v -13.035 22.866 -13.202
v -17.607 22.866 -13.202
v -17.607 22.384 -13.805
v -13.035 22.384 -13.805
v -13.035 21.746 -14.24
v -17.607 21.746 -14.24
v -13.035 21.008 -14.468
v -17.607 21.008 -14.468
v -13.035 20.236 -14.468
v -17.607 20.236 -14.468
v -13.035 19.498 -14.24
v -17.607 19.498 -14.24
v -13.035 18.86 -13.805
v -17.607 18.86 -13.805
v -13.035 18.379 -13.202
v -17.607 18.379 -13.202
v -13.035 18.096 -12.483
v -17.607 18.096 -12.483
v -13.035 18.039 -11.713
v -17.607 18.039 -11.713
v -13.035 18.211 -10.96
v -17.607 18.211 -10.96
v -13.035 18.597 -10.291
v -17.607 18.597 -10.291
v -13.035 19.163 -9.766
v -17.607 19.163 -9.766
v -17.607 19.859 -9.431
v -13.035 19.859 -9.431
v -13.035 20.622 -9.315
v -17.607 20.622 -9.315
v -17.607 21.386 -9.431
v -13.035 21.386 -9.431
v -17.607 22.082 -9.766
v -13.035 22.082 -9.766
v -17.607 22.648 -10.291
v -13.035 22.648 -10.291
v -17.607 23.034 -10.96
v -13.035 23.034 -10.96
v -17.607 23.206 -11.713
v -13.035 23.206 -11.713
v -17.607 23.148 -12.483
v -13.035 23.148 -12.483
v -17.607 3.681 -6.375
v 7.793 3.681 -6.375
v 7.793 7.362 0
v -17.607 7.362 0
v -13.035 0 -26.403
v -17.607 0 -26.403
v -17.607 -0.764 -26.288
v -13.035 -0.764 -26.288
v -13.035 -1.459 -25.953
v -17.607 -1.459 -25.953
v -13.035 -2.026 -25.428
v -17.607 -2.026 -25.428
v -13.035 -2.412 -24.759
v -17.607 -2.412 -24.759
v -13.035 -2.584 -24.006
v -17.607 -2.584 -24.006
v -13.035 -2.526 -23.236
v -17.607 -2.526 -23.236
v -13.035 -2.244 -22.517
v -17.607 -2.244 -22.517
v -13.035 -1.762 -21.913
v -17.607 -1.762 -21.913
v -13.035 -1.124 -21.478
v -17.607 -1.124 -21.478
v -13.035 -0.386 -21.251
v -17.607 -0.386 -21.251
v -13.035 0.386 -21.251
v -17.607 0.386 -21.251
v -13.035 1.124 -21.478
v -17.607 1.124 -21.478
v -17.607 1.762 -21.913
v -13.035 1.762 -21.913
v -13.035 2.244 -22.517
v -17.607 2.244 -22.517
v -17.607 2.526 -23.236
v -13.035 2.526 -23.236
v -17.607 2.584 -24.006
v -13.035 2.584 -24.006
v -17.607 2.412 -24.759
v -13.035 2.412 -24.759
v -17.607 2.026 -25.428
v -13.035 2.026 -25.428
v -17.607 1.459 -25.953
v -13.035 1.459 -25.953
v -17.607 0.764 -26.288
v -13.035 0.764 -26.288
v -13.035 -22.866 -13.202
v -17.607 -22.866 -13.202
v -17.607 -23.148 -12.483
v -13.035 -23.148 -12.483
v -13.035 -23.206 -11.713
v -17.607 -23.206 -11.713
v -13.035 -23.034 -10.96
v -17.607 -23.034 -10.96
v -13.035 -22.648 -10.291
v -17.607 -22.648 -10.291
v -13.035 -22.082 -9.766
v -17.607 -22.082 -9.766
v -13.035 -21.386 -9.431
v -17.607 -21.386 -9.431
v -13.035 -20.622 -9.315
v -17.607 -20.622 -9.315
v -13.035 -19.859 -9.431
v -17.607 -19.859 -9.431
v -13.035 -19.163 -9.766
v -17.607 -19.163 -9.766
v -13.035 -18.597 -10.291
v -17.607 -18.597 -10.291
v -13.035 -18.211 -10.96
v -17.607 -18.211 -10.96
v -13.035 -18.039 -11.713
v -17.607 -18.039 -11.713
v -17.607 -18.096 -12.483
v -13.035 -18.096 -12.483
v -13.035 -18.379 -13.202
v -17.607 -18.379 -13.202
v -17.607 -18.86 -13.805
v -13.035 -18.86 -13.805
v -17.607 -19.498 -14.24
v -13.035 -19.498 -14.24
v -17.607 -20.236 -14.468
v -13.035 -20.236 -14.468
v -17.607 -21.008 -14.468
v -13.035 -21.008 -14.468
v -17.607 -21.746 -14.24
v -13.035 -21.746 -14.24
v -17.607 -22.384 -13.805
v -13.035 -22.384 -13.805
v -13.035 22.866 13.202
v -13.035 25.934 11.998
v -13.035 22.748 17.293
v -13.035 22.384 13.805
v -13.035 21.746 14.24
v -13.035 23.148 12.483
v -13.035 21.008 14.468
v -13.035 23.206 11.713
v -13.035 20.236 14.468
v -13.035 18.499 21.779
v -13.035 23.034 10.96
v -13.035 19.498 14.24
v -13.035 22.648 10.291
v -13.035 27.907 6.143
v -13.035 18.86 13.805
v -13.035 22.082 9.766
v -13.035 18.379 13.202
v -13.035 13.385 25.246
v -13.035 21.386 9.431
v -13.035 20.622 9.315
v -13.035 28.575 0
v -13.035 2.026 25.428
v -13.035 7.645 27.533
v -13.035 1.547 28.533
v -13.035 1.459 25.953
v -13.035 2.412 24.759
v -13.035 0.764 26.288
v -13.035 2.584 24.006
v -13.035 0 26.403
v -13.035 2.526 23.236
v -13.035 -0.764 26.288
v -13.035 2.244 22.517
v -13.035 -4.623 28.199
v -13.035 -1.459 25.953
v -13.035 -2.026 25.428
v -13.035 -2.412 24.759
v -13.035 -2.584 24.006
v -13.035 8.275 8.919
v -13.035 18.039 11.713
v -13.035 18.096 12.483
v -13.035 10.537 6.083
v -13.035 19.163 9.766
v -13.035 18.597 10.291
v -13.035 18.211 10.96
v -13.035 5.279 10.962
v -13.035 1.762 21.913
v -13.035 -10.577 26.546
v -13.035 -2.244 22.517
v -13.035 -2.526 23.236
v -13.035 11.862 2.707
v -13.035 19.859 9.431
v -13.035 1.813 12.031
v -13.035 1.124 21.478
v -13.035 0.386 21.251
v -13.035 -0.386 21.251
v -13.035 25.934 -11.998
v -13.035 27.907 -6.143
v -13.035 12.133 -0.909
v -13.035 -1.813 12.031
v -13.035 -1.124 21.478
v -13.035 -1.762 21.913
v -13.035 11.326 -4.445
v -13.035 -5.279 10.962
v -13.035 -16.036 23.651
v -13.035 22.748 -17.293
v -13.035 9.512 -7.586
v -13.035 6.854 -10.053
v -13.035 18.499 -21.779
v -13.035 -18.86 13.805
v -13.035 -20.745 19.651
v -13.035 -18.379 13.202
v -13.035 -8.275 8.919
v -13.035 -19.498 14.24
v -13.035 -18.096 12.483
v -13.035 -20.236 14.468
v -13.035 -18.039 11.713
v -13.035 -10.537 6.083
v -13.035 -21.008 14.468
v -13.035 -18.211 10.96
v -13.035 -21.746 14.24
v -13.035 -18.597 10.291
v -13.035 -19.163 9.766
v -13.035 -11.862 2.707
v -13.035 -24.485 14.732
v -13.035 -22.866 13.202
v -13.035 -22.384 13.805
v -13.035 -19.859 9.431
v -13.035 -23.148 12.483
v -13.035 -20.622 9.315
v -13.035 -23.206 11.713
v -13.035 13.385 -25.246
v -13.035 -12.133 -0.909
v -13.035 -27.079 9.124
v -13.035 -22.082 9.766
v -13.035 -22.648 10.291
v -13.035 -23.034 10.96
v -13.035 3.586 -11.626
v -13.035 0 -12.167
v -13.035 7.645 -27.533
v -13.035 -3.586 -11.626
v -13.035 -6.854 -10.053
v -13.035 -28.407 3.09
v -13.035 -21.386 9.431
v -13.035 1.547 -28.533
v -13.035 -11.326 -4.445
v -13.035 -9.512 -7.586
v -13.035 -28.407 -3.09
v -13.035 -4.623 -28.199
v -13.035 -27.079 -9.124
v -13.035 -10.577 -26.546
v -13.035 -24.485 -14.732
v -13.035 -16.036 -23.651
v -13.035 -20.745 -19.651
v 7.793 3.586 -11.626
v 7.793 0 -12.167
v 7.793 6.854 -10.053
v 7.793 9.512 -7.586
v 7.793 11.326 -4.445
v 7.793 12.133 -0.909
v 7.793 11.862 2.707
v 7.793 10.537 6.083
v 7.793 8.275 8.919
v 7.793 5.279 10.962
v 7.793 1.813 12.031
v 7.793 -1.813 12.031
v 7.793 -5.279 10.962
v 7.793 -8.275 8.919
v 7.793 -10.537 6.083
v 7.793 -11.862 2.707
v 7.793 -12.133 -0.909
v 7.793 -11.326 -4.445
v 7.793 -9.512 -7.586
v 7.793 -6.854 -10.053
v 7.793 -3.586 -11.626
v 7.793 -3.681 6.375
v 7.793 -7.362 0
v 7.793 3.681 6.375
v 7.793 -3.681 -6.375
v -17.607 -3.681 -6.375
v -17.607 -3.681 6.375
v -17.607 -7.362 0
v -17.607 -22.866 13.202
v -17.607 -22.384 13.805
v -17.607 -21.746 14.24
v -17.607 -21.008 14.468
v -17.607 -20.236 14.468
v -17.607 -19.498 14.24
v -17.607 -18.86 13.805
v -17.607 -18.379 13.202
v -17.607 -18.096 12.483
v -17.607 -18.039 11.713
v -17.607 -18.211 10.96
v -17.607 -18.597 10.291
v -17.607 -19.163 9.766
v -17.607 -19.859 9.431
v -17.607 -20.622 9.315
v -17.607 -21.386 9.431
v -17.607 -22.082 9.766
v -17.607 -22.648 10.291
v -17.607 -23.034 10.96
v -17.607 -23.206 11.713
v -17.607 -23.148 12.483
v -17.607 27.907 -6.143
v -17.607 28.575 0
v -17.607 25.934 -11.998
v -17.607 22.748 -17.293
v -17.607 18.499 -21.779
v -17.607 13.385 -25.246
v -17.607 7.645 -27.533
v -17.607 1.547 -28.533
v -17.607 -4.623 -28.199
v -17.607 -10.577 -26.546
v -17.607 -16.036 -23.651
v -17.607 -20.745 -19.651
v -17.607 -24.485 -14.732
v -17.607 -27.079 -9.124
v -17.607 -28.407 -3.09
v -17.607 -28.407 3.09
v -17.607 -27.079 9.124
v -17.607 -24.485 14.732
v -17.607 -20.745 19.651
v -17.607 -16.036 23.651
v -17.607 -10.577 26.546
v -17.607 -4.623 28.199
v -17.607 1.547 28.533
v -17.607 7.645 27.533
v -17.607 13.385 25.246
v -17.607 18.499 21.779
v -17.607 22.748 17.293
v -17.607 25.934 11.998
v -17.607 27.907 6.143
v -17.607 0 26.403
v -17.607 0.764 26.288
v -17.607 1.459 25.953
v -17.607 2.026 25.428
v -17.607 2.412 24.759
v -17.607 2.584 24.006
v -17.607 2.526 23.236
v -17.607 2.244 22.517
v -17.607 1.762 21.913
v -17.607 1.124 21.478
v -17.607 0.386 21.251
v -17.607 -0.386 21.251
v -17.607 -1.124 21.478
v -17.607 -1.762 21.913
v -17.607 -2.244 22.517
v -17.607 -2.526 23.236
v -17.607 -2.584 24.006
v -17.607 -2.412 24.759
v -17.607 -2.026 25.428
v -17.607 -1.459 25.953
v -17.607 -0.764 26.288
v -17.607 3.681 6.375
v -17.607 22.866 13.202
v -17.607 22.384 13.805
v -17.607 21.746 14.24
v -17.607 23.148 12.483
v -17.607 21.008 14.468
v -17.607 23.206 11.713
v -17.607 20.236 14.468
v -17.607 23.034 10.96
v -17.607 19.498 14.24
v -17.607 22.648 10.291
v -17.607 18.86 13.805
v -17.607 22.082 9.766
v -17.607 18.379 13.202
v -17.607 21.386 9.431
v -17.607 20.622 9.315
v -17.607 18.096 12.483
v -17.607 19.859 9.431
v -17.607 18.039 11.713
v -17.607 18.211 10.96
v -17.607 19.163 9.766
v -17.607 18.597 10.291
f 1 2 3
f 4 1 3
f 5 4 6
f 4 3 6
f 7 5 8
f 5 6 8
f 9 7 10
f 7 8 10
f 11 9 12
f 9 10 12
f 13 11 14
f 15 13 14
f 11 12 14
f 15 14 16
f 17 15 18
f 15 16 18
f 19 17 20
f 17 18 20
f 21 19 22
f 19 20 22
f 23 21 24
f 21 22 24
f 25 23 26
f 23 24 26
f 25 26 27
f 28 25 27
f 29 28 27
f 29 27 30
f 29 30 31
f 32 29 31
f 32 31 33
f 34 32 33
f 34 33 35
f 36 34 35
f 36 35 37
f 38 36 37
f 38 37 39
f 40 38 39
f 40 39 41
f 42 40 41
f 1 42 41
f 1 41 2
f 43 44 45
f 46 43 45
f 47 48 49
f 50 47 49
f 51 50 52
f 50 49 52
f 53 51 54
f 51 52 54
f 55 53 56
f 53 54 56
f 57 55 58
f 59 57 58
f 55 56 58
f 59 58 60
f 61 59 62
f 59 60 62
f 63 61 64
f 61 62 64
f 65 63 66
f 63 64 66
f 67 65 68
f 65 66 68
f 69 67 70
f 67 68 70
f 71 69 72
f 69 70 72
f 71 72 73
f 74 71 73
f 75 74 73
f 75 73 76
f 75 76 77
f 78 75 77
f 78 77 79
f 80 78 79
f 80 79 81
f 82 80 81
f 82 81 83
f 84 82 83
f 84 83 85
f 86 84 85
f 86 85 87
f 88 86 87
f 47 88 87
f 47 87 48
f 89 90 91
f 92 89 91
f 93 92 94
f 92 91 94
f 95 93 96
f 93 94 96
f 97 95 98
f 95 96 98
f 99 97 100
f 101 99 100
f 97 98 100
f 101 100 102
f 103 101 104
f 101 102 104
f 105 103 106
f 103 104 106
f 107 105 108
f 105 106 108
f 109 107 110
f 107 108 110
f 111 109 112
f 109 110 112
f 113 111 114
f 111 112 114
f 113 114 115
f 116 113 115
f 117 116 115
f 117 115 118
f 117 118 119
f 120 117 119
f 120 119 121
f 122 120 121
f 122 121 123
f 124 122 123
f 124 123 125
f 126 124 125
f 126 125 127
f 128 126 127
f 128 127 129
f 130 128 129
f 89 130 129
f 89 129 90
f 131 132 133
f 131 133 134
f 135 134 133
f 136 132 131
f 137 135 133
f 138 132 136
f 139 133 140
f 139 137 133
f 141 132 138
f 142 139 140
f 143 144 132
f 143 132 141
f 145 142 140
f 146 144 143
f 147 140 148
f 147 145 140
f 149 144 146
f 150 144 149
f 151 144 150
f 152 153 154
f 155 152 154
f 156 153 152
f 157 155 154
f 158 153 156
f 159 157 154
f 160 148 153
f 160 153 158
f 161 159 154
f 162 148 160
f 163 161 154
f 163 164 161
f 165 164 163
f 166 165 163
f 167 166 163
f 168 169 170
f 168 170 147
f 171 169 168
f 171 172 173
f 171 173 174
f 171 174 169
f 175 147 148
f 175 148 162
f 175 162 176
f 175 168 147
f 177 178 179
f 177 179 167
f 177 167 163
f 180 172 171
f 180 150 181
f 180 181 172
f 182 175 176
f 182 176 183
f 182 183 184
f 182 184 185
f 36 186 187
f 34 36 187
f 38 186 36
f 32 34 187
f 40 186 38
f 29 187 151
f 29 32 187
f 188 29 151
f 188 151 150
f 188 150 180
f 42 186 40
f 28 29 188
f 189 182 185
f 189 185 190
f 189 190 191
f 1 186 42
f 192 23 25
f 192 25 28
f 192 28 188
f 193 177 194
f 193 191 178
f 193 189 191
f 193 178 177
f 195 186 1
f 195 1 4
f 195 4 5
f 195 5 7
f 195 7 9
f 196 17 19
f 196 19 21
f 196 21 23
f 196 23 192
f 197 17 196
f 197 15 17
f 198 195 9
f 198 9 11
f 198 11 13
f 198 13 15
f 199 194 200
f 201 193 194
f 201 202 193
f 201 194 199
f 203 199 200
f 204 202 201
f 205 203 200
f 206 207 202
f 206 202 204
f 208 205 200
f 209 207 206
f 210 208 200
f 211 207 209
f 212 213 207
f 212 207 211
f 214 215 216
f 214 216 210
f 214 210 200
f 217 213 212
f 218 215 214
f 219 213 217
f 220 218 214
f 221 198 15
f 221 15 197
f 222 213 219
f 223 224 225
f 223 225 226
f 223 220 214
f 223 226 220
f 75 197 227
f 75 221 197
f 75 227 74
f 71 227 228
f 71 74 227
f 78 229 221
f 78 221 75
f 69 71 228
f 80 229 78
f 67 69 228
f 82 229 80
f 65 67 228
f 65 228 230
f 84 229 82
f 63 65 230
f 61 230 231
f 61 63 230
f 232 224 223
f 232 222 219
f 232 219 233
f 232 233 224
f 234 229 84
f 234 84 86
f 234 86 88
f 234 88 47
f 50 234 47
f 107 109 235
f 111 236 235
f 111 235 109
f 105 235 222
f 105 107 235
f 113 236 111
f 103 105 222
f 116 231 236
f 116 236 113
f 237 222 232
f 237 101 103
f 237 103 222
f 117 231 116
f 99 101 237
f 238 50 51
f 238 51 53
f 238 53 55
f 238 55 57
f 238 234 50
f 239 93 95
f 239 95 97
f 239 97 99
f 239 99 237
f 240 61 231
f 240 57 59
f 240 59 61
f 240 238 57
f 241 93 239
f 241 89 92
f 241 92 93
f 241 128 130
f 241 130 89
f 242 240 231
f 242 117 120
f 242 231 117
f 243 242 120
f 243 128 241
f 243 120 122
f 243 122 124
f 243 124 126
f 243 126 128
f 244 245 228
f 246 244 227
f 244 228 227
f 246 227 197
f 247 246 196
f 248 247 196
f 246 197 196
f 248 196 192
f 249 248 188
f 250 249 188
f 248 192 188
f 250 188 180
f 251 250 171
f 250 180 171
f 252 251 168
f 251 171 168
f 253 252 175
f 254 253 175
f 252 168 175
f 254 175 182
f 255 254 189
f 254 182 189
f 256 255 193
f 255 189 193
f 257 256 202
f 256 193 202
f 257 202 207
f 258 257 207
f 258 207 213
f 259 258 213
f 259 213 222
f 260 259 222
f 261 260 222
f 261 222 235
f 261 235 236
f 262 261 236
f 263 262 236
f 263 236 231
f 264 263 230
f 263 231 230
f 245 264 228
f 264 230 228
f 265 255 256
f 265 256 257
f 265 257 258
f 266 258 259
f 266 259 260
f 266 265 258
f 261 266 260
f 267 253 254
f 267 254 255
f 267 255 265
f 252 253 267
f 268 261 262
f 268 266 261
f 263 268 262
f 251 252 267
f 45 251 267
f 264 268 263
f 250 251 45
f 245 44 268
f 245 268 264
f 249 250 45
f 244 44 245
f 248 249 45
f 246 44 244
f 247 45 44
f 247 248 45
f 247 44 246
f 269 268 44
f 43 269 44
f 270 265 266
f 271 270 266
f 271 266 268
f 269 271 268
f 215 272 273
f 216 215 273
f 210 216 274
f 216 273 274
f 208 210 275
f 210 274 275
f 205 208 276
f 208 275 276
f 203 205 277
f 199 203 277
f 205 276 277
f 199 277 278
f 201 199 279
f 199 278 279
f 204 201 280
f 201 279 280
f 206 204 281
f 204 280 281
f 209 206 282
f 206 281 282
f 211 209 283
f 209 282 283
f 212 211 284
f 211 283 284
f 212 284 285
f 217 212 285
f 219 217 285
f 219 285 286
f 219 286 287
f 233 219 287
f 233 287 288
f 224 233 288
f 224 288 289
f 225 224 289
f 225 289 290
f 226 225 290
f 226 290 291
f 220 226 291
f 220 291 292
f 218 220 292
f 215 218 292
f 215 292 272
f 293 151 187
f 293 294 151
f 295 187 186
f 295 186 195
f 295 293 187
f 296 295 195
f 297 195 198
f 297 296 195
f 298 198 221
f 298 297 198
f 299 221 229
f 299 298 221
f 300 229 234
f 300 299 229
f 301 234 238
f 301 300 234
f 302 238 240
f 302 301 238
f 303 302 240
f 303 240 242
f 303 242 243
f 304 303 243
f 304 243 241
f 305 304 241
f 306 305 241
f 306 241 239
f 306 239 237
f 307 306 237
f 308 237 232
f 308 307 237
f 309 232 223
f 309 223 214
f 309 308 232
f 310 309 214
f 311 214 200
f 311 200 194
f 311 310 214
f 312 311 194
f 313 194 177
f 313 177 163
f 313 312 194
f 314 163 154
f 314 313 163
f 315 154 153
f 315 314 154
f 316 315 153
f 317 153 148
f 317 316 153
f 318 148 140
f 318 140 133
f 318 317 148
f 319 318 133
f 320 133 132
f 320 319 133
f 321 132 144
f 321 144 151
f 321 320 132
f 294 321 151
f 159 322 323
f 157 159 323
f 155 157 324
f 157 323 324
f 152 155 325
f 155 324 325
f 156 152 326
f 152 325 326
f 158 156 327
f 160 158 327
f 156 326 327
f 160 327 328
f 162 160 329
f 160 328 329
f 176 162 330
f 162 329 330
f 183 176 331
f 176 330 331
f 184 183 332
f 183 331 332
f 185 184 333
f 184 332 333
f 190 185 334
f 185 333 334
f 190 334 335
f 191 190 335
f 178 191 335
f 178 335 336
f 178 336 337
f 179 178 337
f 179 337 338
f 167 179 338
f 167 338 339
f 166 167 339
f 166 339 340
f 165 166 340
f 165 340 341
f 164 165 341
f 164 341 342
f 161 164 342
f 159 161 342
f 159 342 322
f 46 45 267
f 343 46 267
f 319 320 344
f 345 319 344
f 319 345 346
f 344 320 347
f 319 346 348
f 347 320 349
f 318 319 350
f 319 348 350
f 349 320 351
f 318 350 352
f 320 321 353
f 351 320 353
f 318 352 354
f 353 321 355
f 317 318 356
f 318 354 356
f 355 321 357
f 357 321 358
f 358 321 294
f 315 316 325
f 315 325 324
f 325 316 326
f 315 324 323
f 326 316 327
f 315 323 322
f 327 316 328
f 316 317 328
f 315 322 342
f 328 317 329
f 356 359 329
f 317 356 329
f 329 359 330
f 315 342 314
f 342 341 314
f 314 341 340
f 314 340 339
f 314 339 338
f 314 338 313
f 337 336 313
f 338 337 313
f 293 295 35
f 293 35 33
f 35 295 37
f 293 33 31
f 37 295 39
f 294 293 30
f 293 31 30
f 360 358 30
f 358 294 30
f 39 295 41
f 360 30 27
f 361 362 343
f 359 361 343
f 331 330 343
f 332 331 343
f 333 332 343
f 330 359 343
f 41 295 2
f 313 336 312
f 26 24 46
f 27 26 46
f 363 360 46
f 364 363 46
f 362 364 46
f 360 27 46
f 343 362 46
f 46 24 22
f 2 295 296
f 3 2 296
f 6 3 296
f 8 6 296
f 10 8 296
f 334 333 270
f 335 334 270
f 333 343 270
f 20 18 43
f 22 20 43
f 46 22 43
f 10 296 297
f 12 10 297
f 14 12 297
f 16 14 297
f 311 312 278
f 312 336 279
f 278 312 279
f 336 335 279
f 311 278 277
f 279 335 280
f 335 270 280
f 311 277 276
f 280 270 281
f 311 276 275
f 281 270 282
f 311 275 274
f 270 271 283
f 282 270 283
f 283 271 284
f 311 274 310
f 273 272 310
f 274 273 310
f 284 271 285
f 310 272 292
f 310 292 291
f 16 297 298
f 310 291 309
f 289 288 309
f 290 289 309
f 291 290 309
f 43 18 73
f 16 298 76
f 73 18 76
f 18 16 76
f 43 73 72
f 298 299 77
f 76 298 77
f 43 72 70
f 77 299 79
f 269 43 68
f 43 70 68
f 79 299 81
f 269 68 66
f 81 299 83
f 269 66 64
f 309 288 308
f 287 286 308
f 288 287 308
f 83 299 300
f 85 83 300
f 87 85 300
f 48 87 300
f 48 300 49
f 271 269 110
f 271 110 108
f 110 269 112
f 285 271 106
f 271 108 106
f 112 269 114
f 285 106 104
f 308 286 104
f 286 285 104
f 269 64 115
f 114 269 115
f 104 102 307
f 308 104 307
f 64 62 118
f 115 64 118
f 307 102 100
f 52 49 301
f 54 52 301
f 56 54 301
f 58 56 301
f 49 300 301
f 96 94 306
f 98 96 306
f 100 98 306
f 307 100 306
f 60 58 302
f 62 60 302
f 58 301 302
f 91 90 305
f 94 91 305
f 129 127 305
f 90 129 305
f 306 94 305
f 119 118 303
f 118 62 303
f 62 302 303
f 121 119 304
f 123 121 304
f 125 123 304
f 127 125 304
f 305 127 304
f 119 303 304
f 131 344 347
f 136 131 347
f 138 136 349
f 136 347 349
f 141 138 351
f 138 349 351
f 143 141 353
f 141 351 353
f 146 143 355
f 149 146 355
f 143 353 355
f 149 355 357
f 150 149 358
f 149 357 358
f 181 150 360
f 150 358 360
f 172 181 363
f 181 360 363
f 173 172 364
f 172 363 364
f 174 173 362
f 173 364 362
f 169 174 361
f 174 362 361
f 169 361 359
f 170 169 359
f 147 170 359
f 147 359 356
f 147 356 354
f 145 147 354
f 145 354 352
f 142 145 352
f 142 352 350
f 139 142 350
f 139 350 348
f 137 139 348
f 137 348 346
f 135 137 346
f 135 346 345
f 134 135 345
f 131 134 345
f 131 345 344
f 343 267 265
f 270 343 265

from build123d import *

# Parameters (mm, degrees)
SKETCH1_W           = 4.572
SKETCH1_H           = 28.575
SKETCH2_R           = 12.1666
BOSS_EXTRUDE1_DEPTH = 20.828
CUT_EXTRUDE1_DEPTH  = 26.4
HOLE1_D             = 5.1816
HOLE1_DEPTH         = 4.572
CIRPATTERN1_COUNT   = 6


with BuildPart() as part:
    # Sketch1 → Revolve1 (revolve)
    with BuildSketch(Plane(origin=(0, 0, 0), x_dir=(-1, 0, 0), z_dir=(0, 0, -1))):
        with Locations((15.321066246, 14.2875)):
            Rectangle(SKETCH1_W, SKETCH1_H)
    revolve(axis=Axis((-13.035066246, 0, 0), (-1, 0, 0)))

    # Sketch2 → Boss-Extrude1 (add)
    with BuildSketch(Plane(origin=(-13.035066246, 0, 0), x_dir=(0, 0, -1), z_dir=(1, 0, 0))):
        Circle(SKETCH2_R)
    extrude(amount=BOSS_EXTRUDE1_DEPTH)

    # Sketch3 → Cut-Extrude1 (cut, through all)
    with BuildSketch(Plane(origin=(7.792933754, 0, 0), x_dir=(0, 0, -1), z_dir=(1, 0, 0))):
        Polygon((0, -7.361697812), (6.3754, -3.680858906), (6.3754, 3.680818906), (0, 7.361657812), (-6.3754, 3.680818906), (-6.3754, -3.680858906), align=None)
    extrude(amount=-CUT_EXTRUDE1_DEPTH, mode=Mode.SUBTRACT)

    # Hole1
    with Locations(Plane(origin=(-13.035066246, 0, 0), x_dir=(0, 0, -1), z_dir=(1, 0, 0))):
        with Locations((-23.8125, 0)):
            hole1 = Hole(HOLE1_D / 2, depth=HOLE1_DEPTH)

    # CirPattern1: Hole1 ×6 about axis
    cirpattern1_axis = Axis((0, 0, 0), (1, 0, 0))
    for i in range(1, CIRPATTERN1_COUNT):
        add(hole1.rotate(cirpattern1_axis, i * 360 / CIRPATTERN1_COUNT), mode=Mode.SUBTRACT)


solid = part.part
